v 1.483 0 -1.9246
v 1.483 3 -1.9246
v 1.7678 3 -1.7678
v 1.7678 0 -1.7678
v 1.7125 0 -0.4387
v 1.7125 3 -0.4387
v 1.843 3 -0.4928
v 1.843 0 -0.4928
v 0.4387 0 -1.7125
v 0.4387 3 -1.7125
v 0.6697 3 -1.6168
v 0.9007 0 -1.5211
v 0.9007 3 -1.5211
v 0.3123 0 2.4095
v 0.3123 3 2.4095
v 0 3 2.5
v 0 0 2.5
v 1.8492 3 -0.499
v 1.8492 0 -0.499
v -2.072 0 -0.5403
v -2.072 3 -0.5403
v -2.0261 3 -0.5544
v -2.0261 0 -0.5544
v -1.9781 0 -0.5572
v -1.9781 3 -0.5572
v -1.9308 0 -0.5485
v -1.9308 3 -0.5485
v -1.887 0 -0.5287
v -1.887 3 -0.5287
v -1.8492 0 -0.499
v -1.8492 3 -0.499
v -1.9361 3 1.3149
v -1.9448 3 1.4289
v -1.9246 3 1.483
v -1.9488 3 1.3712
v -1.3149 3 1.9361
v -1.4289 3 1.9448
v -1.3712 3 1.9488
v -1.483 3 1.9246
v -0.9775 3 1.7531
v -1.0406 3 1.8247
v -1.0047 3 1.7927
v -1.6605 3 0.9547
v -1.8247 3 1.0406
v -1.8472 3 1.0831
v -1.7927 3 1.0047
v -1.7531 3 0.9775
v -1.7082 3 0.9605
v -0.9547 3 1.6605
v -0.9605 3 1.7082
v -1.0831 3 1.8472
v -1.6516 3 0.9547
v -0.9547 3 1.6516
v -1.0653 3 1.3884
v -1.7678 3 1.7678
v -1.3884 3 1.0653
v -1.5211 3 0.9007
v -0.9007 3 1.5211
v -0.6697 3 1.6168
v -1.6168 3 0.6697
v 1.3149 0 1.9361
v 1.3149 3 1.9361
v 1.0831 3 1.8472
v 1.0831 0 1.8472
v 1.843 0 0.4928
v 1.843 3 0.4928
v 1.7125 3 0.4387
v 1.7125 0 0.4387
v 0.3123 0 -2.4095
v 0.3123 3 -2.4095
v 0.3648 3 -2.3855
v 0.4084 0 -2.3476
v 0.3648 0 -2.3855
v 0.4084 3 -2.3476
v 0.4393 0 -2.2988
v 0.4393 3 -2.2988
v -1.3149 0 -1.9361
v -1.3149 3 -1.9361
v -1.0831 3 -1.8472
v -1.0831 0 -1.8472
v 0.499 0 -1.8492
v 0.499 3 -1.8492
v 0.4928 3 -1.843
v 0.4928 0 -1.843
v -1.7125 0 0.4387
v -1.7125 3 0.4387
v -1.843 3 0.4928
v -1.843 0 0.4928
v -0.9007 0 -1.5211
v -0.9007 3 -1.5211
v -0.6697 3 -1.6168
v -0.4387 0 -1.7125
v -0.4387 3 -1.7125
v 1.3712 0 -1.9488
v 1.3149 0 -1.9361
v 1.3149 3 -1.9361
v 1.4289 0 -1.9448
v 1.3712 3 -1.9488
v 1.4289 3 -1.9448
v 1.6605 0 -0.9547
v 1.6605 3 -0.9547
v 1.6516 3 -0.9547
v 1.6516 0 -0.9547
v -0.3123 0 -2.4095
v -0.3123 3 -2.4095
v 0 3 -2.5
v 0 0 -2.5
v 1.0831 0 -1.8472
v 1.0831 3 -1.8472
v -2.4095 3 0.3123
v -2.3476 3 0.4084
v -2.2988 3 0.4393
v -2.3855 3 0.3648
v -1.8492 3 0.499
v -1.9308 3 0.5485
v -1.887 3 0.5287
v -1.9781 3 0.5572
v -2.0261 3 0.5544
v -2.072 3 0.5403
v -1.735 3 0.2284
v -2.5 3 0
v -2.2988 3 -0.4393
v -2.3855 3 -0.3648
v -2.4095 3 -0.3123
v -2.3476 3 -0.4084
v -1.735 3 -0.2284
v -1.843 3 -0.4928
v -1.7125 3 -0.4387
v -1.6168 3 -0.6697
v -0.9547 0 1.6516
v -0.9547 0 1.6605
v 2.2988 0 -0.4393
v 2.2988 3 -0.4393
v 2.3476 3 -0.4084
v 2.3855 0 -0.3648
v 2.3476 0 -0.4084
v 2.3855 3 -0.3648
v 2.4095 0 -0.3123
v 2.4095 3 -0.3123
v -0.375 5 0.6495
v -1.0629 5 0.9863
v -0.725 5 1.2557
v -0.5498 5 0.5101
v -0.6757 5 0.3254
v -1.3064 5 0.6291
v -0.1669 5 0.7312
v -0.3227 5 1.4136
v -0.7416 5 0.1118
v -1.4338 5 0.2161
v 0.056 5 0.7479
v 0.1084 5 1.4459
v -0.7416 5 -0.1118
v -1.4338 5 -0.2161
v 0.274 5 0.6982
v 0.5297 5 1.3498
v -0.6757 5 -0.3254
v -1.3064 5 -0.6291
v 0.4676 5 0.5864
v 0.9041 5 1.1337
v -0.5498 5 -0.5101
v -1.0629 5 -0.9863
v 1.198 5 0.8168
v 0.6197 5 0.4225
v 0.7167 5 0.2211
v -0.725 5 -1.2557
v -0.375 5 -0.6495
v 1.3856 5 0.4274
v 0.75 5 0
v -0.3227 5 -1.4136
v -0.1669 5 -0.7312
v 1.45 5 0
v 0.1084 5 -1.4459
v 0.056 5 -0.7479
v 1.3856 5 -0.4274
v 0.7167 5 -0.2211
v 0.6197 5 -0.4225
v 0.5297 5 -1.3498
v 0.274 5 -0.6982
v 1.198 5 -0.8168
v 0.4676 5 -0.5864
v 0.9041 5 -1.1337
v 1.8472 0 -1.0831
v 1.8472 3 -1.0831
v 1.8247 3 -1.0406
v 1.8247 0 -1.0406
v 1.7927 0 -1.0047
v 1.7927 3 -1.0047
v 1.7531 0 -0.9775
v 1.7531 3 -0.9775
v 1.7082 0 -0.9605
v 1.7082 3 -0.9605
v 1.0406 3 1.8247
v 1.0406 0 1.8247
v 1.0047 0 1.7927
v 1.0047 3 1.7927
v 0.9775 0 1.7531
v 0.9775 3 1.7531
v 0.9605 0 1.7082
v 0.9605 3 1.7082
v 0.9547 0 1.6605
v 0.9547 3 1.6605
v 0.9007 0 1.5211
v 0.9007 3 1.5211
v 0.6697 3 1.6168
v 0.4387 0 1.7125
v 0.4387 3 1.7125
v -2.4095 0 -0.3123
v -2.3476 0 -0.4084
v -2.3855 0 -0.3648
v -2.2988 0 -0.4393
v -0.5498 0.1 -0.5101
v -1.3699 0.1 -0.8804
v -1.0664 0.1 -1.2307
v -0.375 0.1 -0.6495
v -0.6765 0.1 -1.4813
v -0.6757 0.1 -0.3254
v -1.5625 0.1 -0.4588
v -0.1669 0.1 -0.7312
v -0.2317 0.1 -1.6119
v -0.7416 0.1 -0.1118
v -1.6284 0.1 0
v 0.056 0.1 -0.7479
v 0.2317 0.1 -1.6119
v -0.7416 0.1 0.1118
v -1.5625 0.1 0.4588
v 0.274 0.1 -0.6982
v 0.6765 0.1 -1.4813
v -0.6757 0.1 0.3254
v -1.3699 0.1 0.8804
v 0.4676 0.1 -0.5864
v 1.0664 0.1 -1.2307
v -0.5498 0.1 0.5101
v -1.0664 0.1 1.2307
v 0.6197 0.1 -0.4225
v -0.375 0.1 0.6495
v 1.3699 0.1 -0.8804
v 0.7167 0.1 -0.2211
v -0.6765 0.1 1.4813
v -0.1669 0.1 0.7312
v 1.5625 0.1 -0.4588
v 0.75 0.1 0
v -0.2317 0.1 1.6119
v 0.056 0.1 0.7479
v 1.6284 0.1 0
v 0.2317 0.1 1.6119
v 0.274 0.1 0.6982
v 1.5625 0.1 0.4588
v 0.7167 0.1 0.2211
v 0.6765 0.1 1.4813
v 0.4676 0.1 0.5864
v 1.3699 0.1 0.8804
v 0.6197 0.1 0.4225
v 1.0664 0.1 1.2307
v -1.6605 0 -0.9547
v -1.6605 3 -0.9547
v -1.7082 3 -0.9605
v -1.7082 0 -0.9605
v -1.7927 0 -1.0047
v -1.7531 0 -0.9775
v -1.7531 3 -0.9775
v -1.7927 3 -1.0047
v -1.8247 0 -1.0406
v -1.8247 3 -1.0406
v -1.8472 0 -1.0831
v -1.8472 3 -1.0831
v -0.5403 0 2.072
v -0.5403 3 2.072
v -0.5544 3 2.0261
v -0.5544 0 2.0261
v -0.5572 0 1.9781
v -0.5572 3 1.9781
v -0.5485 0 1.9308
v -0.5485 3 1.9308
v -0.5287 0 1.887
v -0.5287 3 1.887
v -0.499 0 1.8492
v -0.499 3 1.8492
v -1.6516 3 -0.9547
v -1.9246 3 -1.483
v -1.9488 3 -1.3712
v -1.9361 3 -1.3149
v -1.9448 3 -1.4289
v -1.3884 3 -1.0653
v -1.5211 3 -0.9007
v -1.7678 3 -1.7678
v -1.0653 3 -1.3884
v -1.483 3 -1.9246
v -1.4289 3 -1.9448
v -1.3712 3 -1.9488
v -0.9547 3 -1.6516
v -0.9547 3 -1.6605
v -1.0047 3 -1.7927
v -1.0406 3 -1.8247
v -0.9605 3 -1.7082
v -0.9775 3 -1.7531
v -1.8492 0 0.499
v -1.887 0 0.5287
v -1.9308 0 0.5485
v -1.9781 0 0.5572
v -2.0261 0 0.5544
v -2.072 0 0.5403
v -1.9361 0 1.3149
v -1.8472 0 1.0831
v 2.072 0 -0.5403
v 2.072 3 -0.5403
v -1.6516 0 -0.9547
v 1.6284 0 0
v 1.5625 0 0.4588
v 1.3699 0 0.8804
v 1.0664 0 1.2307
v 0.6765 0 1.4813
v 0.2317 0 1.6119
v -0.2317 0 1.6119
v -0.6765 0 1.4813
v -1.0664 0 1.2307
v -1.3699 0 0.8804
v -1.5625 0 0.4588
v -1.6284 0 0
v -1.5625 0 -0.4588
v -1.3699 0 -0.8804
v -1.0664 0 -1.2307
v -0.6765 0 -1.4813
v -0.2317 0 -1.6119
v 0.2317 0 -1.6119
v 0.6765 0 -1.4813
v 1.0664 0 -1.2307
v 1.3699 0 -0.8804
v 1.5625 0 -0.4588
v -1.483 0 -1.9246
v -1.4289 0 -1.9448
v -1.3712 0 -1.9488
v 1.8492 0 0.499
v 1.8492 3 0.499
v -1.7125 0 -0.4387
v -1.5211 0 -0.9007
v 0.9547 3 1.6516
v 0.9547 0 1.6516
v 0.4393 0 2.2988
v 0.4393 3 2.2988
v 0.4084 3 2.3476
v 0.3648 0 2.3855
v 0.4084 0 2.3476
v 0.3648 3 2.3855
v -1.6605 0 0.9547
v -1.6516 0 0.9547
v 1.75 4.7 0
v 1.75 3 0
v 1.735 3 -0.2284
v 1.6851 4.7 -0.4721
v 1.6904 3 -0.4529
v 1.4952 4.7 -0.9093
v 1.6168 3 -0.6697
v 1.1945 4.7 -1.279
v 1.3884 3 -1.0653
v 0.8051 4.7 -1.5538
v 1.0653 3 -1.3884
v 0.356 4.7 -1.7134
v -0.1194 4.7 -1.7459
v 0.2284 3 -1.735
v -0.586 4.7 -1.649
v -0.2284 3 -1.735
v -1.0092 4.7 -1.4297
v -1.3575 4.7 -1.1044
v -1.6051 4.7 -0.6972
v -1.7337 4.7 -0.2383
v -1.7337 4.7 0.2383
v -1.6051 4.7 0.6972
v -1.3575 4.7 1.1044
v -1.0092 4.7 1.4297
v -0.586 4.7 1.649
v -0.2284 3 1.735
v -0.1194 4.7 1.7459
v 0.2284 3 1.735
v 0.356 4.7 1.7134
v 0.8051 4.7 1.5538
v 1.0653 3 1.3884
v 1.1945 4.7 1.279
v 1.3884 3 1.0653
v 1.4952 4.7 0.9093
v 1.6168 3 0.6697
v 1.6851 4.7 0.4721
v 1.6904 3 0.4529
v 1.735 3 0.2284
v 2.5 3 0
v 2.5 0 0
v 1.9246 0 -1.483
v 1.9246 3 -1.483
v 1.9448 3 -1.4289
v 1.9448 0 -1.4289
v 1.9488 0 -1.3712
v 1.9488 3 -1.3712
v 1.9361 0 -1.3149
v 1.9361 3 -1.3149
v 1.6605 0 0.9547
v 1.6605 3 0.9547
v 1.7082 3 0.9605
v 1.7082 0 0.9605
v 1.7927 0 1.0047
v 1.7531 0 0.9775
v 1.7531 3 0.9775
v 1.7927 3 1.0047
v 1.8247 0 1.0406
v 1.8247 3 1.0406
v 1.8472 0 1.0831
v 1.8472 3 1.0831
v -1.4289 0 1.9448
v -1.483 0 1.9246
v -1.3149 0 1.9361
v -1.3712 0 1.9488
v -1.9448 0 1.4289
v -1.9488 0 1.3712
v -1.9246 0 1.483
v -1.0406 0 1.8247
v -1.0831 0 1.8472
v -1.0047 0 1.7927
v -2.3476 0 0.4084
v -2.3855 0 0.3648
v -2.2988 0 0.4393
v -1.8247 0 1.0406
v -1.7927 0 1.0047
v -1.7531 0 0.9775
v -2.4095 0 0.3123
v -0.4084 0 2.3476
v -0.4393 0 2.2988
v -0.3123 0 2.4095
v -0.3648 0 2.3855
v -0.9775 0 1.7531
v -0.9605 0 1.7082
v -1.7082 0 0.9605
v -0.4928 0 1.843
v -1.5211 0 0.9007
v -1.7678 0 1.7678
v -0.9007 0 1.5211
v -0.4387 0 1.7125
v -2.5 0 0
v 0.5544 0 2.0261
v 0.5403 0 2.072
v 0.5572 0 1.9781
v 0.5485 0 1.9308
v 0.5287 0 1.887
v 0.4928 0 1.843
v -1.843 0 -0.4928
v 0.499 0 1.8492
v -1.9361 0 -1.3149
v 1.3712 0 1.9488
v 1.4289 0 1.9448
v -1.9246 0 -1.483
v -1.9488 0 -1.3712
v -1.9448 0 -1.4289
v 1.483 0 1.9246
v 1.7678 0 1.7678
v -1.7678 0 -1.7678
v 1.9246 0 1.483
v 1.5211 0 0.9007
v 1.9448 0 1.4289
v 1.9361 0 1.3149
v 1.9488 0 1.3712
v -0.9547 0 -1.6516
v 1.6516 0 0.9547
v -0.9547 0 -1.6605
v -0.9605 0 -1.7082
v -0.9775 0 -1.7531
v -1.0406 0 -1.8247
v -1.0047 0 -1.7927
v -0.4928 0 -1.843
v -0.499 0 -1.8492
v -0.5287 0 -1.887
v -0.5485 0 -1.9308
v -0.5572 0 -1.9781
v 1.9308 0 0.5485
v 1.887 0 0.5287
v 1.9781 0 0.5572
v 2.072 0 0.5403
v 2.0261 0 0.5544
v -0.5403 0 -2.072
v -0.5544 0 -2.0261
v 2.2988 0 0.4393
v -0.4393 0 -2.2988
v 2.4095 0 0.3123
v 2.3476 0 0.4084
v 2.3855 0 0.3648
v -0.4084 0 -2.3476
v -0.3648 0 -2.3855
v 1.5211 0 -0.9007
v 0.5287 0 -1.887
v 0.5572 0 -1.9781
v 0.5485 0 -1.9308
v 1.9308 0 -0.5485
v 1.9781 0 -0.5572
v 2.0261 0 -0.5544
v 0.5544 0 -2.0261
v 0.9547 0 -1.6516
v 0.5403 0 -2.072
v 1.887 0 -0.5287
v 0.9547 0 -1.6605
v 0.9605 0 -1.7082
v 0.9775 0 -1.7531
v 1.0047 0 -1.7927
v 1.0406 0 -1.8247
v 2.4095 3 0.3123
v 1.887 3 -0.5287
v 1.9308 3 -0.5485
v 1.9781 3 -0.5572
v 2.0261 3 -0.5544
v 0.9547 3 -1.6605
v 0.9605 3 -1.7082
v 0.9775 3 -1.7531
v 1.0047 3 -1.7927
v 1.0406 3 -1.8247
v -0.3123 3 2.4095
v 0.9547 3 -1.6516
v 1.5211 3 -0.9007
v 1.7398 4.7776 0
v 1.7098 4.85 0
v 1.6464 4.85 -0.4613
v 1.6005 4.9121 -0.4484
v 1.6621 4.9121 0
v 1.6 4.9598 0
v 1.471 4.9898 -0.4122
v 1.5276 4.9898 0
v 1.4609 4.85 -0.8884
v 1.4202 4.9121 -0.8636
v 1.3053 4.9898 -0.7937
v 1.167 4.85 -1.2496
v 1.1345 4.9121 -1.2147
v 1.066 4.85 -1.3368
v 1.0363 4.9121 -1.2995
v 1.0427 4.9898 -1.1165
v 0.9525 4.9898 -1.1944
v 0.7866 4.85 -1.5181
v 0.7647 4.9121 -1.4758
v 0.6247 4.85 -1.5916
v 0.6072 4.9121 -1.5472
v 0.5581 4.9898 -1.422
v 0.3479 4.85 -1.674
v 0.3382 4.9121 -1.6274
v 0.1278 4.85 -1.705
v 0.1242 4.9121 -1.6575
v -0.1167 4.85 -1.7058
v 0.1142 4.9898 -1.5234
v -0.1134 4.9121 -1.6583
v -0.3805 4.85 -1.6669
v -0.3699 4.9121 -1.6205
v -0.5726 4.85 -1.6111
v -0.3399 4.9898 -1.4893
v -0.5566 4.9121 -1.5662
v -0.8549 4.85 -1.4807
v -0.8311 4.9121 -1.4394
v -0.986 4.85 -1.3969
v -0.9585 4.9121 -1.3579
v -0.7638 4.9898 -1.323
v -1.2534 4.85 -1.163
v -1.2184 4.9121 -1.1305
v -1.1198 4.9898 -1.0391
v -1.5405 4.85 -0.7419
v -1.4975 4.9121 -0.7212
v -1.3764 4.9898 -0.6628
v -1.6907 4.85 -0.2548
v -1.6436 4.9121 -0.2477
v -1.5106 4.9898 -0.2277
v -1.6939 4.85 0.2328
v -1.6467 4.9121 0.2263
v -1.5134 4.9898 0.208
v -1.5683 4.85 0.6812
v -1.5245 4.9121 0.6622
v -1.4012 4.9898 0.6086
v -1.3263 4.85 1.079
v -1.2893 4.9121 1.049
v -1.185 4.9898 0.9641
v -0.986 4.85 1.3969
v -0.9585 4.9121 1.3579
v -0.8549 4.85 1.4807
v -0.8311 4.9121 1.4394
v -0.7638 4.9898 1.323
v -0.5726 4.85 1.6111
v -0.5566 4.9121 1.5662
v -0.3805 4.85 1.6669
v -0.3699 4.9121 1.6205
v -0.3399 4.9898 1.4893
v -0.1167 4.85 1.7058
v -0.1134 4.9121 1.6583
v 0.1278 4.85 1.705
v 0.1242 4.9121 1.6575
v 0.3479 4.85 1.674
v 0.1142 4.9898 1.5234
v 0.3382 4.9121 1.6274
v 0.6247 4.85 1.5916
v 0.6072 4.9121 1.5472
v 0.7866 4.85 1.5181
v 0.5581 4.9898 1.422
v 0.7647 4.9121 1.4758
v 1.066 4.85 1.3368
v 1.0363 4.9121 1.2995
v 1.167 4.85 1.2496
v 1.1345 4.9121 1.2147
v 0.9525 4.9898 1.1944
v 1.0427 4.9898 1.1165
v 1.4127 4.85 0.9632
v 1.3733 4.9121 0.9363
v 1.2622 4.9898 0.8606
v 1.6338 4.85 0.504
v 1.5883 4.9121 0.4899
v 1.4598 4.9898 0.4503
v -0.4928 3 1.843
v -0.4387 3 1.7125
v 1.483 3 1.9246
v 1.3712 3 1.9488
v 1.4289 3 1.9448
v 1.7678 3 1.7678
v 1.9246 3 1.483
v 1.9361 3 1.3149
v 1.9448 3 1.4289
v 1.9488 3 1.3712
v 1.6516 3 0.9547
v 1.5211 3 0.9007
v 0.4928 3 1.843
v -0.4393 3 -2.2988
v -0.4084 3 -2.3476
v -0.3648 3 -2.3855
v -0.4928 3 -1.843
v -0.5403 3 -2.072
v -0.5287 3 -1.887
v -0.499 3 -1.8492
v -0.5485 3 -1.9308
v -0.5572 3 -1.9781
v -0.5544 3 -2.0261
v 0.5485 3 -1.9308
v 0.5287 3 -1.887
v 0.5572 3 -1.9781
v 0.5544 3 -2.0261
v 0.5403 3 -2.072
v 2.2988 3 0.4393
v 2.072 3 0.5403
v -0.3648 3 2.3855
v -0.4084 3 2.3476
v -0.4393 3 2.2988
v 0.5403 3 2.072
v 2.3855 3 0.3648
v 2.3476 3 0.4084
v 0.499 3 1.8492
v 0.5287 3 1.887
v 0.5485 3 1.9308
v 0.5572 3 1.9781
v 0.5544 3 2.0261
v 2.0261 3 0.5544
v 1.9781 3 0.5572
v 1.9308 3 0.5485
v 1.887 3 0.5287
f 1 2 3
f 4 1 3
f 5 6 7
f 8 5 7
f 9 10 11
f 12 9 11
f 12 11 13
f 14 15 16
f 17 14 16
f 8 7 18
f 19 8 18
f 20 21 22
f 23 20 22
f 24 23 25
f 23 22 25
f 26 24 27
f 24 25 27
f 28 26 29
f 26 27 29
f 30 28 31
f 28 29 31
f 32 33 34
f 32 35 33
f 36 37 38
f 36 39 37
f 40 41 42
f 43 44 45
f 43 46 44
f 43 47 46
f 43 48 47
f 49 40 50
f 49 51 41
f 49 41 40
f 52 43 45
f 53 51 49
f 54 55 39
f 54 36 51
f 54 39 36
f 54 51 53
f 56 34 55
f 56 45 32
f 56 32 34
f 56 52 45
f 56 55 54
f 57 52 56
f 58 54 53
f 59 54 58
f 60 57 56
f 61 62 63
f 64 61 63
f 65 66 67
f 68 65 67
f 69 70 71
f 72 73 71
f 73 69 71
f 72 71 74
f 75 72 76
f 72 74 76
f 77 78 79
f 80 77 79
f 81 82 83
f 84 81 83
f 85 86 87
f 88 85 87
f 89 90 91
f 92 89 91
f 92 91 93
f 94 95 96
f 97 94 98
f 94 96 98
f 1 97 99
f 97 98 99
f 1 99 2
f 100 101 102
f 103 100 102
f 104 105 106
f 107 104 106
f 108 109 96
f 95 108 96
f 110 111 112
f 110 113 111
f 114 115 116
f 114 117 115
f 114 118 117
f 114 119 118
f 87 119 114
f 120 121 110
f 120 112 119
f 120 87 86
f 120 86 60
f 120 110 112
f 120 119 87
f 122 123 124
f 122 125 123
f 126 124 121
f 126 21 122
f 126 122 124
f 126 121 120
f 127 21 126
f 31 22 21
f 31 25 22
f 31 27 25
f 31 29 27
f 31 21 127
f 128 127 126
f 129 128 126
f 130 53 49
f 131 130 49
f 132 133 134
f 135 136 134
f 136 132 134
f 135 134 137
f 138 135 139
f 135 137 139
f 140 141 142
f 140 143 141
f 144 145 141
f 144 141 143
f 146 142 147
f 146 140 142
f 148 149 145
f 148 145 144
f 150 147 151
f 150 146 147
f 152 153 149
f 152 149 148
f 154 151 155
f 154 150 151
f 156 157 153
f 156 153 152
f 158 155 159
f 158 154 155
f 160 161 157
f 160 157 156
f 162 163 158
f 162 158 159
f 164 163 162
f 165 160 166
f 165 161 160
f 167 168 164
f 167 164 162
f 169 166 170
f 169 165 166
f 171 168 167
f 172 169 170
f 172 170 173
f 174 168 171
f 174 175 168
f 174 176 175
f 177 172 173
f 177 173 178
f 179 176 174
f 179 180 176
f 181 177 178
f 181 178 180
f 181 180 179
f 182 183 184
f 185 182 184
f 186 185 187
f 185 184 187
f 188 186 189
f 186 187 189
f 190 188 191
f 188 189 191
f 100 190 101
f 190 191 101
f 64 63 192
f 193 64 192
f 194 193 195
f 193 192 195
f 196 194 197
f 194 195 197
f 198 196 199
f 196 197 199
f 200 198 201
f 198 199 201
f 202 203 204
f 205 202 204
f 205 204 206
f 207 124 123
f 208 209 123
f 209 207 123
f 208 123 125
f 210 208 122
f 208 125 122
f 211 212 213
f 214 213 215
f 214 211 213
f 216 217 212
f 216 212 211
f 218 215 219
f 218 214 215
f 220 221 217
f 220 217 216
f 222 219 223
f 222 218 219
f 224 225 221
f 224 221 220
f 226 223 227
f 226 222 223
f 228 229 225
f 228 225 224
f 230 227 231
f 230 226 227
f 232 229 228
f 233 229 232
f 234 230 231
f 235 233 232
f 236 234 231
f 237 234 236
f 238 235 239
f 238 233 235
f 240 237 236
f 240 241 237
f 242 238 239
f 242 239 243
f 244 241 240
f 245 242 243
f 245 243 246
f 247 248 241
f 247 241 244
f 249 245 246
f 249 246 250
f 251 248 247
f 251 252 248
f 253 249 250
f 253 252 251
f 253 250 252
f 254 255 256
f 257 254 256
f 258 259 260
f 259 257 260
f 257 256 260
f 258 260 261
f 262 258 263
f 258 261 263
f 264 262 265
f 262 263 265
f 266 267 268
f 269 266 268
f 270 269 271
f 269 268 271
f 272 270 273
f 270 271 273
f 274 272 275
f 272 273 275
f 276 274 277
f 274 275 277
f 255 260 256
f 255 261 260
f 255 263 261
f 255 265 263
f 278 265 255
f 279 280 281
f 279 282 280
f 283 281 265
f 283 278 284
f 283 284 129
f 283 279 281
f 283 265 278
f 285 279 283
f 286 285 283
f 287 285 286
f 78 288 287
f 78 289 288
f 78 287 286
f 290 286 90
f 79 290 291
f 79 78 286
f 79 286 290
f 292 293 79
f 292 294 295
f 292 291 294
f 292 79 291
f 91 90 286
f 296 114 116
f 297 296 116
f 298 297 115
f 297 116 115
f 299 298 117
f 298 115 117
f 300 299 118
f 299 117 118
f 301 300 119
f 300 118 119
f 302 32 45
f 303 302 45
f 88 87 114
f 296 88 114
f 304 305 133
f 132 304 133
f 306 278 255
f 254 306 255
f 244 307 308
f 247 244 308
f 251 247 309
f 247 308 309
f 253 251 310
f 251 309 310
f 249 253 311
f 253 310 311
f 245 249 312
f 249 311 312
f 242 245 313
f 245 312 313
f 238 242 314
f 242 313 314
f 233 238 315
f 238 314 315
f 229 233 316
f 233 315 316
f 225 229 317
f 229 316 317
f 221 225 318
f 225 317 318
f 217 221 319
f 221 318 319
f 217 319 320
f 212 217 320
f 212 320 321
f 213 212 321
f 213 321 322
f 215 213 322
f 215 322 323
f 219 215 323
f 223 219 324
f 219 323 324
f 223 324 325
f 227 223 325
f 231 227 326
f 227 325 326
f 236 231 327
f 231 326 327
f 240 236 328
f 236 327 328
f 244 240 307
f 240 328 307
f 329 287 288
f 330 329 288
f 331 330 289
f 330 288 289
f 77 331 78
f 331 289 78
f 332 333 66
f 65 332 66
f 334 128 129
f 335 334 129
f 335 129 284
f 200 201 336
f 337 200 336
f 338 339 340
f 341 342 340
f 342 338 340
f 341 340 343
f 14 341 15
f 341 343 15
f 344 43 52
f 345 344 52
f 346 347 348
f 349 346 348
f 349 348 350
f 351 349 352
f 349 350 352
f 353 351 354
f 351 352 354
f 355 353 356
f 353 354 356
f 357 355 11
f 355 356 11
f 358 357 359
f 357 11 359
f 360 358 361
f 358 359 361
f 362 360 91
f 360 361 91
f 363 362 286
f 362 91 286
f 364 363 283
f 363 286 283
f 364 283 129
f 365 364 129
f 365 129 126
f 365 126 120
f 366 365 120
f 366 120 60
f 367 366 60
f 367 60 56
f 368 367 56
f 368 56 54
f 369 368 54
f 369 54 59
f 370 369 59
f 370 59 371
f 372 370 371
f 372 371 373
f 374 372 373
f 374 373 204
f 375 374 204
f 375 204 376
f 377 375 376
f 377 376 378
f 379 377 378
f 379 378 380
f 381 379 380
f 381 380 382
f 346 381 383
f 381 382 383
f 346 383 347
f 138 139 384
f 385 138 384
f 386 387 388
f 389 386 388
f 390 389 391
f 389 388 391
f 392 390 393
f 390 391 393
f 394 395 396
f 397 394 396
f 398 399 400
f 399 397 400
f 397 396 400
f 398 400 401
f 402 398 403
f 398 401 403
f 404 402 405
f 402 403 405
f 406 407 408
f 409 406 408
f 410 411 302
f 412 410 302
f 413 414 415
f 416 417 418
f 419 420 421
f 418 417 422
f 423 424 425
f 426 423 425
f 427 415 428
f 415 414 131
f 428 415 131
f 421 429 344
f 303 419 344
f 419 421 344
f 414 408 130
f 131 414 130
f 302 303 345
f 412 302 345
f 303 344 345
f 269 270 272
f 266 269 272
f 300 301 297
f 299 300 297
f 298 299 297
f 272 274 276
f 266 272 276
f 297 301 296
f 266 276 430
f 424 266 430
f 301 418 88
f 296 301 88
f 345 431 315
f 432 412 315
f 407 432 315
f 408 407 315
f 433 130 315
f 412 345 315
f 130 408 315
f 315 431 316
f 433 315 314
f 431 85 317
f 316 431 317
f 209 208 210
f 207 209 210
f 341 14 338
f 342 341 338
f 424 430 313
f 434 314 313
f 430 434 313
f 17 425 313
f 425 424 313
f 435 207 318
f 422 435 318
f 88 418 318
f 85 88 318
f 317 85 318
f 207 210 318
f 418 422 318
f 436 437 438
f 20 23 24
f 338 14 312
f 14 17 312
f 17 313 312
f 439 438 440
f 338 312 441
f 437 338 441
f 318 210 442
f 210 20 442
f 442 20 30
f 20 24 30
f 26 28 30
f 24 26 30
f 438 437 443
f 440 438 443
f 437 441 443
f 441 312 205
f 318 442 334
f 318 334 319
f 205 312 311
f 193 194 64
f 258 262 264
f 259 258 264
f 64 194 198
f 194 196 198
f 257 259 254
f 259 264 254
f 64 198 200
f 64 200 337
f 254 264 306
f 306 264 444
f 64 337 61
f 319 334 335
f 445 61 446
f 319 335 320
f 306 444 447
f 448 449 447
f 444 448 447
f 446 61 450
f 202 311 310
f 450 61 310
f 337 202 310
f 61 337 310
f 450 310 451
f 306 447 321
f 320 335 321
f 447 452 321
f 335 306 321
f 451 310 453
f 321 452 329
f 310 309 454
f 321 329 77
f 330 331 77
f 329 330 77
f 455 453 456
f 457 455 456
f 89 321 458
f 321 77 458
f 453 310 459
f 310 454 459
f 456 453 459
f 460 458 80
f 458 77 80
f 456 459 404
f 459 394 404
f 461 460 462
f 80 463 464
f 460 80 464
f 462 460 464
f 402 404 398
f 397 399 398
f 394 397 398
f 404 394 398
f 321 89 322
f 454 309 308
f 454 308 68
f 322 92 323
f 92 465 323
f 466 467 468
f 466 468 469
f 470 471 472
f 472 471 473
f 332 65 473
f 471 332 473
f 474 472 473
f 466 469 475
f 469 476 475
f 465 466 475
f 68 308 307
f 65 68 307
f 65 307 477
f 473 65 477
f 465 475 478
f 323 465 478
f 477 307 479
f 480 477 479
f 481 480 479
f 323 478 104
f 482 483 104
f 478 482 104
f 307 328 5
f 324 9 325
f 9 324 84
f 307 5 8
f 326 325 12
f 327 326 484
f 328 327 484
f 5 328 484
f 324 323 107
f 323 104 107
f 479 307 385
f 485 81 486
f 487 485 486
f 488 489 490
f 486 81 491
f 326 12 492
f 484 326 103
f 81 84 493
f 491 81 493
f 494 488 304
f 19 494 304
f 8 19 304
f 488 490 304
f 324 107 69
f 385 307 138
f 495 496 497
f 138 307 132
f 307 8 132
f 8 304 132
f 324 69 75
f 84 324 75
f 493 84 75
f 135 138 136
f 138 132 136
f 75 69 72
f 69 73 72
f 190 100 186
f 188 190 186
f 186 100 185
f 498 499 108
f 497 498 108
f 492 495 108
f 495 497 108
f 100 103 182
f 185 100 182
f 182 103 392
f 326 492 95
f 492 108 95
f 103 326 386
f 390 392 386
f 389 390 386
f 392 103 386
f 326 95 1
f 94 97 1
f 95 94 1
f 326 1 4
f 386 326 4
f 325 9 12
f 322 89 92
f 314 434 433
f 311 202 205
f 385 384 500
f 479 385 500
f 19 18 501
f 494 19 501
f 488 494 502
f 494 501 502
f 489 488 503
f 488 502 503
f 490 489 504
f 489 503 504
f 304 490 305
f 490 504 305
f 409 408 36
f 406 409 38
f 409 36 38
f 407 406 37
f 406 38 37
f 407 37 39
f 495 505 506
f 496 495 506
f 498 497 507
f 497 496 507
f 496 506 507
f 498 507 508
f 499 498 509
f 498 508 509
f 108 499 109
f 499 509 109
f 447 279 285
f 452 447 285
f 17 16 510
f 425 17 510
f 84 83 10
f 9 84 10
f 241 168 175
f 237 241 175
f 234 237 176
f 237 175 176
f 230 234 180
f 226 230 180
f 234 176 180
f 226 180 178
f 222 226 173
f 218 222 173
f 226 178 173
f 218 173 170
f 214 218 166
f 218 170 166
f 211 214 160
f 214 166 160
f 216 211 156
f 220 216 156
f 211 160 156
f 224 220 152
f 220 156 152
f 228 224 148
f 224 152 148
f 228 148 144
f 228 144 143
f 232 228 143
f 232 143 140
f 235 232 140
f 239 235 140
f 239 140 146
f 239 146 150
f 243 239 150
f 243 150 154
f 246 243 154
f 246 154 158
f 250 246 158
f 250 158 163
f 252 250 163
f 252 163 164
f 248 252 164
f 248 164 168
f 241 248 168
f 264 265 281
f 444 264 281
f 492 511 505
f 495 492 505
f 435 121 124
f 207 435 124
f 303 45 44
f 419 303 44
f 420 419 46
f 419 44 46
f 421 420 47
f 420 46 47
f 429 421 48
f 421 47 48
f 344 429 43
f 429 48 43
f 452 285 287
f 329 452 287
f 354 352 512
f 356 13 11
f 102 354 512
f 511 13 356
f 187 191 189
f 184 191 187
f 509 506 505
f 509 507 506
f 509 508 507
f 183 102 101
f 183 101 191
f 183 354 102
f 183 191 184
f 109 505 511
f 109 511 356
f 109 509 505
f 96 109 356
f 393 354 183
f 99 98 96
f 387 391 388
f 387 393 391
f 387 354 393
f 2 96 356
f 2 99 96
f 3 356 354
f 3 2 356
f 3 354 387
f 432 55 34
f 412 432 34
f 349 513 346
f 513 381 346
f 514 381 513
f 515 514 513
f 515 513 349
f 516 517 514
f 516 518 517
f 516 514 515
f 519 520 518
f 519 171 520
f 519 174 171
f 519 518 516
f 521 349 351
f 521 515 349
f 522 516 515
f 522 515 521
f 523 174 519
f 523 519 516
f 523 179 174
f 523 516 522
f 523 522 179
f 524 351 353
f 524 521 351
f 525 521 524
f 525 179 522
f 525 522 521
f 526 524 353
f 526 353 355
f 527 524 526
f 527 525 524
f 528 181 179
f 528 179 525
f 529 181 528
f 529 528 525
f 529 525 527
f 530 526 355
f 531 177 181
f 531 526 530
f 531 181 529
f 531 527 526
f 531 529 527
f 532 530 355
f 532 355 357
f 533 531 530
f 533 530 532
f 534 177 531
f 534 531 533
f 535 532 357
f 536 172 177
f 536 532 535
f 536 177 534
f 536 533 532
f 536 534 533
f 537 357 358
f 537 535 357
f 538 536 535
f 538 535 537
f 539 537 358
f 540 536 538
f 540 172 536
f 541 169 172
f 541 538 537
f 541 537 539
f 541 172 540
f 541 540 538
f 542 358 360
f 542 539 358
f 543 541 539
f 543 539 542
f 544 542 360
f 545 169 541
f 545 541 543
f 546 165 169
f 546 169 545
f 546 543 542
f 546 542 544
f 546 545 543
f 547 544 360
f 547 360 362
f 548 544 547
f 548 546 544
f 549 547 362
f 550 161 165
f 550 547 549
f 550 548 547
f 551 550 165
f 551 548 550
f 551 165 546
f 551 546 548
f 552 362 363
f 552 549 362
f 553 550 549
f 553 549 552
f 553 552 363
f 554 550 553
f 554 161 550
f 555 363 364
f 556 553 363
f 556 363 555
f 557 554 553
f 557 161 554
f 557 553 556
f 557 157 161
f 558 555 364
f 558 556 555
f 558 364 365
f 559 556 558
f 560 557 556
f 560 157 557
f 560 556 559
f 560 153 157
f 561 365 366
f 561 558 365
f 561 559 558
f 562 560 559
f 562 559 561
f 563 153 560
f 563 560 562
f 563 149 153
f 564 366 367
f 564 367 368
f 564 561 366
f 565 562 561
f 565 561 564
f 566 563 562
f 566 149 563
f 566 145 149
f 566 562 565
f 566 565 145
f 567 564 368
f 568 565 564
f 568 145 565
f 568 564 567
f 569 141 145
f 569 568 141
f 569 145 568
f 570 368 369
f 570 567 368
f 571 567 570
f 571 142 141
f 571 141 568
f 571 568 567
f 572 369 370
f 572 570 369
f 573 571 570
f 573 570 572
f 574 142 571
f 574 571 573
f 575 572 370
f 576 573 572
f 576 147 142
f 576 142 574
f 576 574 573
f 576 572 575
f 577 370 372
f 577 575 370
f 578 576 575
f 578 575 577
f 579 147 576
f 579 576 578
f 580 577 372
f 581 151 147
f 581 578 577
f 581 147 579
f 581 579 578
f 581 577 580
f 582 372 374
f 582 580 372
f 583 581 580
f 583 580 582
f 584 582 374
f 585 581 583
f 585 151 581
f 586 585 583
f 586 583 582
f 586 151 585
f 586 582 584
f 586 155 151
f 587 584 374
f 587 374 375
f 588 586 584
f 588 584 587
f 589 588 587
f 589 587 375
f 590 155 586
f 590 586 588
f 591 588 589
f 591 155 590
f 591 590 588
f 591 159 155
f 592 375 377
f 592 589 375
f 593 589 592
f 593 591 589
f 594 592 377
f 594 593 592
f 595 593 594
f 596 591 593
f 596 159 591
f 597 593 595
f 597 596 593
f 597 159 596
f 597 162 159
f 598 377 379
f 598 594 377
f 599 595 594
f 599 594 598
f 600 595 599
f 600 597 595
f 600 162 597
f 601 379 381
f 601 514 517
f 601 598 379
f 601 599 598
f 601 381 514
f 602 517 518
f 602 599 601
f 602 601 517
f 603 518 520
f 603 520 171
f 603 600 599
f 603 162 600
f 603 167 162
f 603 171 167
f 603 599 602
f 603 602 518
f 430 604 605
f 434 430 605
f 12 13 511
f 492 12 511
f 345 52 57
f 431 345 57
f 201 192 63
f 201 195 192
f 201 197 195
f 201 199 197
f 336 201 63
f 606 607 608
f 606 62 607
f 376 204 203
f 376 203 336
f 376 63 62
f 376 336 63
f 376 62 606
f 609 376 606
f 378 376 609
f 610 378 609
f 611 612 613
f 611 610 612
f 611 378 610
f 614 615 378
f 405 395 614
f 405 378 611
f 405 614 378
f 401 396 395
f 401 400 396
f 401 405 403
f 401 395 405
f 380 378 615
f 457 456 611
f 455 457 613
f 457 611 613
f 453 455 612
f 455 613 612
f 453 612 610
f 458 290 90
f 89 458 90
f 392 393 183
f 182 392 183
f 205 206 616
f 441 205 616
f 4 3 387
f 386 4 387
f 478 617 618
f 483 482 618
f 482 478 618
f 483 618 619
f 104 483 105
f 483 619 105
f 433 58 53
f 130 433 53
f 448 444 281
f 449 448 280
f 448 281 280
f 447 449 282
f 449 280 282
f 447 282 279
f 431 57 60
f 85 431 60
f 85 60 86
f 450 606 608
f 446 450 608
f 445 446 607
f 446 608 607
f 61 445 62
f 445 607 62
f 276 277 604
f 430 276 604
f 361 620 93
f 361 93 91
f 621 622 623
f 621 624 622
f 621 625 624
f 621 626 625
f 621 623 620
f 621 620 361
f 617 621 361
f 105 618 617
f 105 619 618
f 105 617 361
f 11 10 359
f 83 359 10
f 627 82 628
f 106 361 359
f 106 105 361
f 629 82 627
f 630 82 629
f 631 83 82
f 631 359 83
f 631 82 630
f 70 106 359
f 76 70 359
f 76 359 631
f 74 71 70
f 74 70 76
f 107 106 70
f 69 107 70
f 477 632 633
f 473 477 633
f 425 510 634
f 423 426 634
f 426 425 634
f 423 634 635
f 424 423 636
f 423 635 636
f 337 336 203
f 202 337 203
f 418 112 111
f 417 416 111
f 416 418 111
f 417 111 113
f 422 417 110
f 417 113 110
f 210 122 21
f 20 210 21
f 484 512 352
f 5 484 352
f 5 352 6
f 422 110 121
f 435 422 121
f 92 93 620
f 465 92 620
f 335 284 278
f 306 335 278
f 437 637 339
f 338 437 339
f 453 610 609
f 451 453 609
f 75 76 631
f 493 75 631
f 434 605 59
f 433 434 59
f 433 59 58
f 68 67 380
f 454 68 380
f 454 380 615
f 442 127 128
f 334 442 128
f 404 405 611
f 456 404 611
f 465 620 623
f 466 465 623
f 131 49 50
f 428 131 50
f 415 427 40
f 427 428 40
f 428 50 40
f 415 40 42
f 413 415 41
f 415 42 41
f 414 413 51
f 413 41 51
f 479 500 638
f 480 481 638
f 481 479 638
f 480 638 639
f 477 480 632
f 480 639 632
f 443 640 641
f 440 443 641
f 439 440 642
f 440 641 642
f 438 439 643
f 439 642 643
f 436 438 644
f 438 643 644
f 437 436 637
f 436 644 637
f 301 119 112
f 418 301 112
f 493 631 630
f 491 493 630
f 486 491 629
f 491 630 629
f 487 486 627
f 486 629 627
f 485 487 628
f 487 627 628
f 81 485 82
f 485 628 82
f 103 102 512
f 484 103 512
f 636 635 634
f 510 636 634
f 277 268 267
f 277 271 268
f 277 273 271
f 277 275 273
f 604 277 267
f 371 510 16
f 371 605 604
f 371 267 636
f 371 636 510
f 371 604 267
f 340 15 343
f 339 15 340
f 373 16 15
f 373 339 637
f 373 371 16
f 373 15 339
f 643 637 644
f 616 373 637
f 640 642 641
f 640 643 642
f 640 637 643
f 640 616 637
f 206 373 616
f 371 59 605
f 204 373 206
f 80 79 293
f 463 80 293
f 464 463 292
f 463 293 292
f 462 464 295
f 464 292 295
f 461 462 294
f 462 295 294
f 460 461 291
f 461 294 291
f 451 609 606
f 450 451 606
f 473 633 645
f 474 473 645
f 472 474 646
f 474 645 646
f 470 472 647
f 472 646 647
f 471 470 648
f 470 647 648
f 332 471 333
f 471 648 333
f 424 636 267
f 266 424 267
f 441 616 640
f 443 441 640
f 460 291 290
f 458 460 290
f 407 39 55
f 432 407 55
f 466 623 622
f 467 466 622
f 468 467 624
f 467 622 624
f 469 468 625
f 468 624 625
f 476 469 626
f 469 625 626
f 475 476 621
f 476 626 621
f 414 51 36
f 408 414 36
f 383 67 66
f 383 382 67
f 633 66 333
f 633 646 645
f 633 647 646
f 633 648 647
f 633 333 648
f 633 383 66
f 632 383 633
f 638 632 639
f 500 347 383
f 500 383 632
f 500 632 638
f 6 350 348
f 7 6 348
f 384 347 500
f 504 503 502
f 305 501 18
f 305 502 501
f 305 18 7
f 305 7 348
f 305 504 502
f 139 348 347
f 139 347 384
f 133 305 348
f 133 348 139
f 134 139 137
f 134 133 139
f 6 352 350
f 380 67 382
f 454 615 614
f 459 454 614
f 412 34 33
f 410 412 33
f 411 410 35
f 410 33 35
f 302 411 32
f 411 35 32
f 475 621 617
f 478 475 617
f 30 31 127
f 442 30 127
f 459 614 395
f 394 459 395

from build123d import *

# Parameters (mm, degrees)
SKETCH1_R           = 2.5
BOSS_EXTRUDE1_DEPTH = 3
SKETCH2_R           = 1.75
BOSS_EXTRUDE2_DEPTH = 2
SKETCH3_R           = 0.75
CUT_EXTRUDE1_DEPTH  = 6
SKETCH4_R           = 2.750200345
CUT_EXTRUDE3_DEPTH  = 4
SKETCH5_R           = 1.628426881
CUT_EXTRUDE4_DEPTH  = 0.1
FILLET1_R           = 0.3


with BuildPart() as part:
    # Sketch1 → Boss-Extrude1 (new body)
    with BuildSketch(Plane(origin=(0, 0, 0), x_dir=(1, 0, 0), z_dir=(0, 1, 0))):
        Circle(SKETCH1_R)
    extrude(amount=BOSS_EXTRUDE1_DEPTH)

    # Sketch2 → Boss-Extrude2 (add)
    with BuildSketch(Plane(origin=(0, 3, 0), x_dir=(1, 0, 0), z_dir=(0, 1, 0))):
        Circle(SKETCH2_R)
    extrude(amount=BOSS_EXTRUDE2_DEPTH)

    # Sketch3 → Cut-Extrude1 (cut, through all)
    with BuildSketch(Plane(origin=(0, 5, 0), x_dir=(1, 0, 0), z_dir=(0, 1, 0))):
        Circle(SKETCH3_R)
    extrude(amount=-CUT_EXTRUDE1_DEPTH, mode=Mode.SUBTRACT)

    # Sketch4 → Cut-Extrude3 (cut, through all)
    with BuildSketch(Plane(origin=(0, 3, 0), x_dir=(1, 0, 0), z_dir=(0, 1, 0))):
        Circle(SKETCH4_R)
        with BuildLine():
            Line((-1.71246004, 0.438726124), (-1.521118324, 0.90066589))
            Line((-1.521118324, 0.90066589), (-1.651645181, 0.954731884))
            Line((-1.651645181, 0.954731884), (-1.660451872, 0.954731884))
            ThreePointArc((-1.660451872, 0.954731884), (-1.773754473, 0.989921325), (-1.847186523, 1.083106679))
            Line((-1.847186523, 1.083106679), (-1.936085443, 1.314875773))
            ThreePointArc((-1.936085443, 1.314875773), (-1.948881988, 1.400186804), (-1.924557132, 1.482951682))
            Line((-1.924557132, 1.482951682), (-1.767766953, 1.767766953))
            Line((-1.767766953, 1.767766953), (-1.482951682, 1.924557132))
            ThreePointArc((-1.482951682, 1.924557132), (-1.400186804, 1.948881988), (-1.314875773, 1.936085443))
            Line((-1.314875773, 1.936085443), (-1.083106679, 1.847186523))
            ThreePointArc((-1.083106679, 1.847186523), (-0.989921325, 1.773754473), (-0.954731884, 1.660451872))
            Line((-0.954731884, 1.660451872), (-0.954731884, 1.651645181))
            Line((-0.954731884, 1.651645181), (-0.90066589, 1.521118324))
            Line((-0.90066589, 1.521118324), (-0.438726124, 1.71246004))
            Line((-0.438726124, 1.71246004), (-0.492792118, 1.842986897))
            Line((-0.492792118, 1.842986897), (-0.499019389, 1.849214168))
            ThreePointArc((-0.499019389, 1.849214168), (-0.554253735, 1.954213898), (-0.540286039, 2.072030195))
            Line((-0.540286039, 2.072030195), (-0.43926157, 2.298776721))
            ThreePointArc((-0.43926157, 2.298776721), (-0.387986085, 2.368149253), (-0.312262208, 2.409472589))
            Line((-0.312262208, 2.409472589), (0, 2.5))
            Line((0, 2.5), (0.312262208, 2.409472589))
            ThreePointArc((0.312262208, 2.409472589), (0.387986085, 2.368149253), (0.43926157, 2.298776721))
            Line((0.43926157, 2.298776721), (0.540286039, 2.072030195))
            ThreePointArc((0.540286039, 2.072030195), (0.554253735, 1.954213898), (0.499019389, 1.849214168))
            Line((0.499019389, 1.849214168), (0.492792118, 1.842986897))
            Line((0.492792118, 1.842986897), (0.438726124, 1.71246004))
            Line((0.438726124, 1.71246004), (0.90066589, 1.521118324))
            Line((0.90066589, 1.521118324), (0.954731884, 1.651645181))
            Line((0.954731884, 1.651645181), (0.954731884, 1.660451872))
            ThreePointArc((0.954731884, 1.660451872), (0.989921325, 1.773754473), (1.083106679, 1.847186523))
            Line((1.083106679, 1.847186523), (1.314875773, 1.936085443))
            ThreePointArc((1.314875773, 1.936085443), (1.400186804, 1.948881988), (1.482951682, 1.924557132))
            Line((1.482951682, 1.924557132), (1.767766953, 1.767766953))
            Line((1.767766953, 1.767766953), (1.924557132, 1.482951682))
            ThreePointArc((1.924557132, 1.482951682), (1.948881988, 1.400186804), (1.936085443, 1.314875773))
            Line((1.936085443, 1.314875773), (1.847186523, 1.083106679))
            ThreePointArc((1.847186523, 1.083106679), (1.773754473, 0.989921325), (1.660451872, 0.954731884))
            Line((1.660451872, 0.954731884), (1.651645181, 0.954731884))
            Line((1.651645181, 0.954731884), (1.521118324, 0.90066589))
            Line((1.521118324, 0.90066589), (1.71246004, 0.438726124))
            Line((1.71246004, 0.438726124), (1.842986897, 0.492792118))
            Line((1.842986897, 0.492792118), (1.849214168, 0.499019389))
            ThreePointArc((1.849214168, 0.499019389), (1.954213898, 0.554253735), (2.072030195, 0.540286039))
            Line((2.072030195, 0.540286039), (2.298776721, 0.43926157))
            ThreePointArc((2.298776721, 0.43926157), (2.368149253, 0.387986085), (2.409472589, 0.312262208))
            Line((2.409472589, 0.312262208), (2.5, 0))
            Line((2.5, 0), (2.409472589, -0.312262208))
            ThreePointArc((2.409472589, -0.312262208), (2.368149253, -0.387986085), (2.298776721, -0.43926157))
            Line((2.298776721, -0.43926157), (2.072030195, -0.540286039))
            ThreePointArc((2.072030195, -0.540286039), (1.954213898, -0.554253735), (1.849214168, -0.499019389))
            Line((1.849214168, -0.499019389), (1.842986897, -0.492792118))
            Line((1.842986897, -0.492792118), (1.71246004, -0.438726124))
            Line((1.71246004, -0.438726124), (1.521118324, -0.90066589))
            Line((1.521118324, -0.90066589), (1.651645181, -0.954731884))
            Line((1.651645181, -0.954731884), (1.660451872, -0.954731884))
            ThreePointArc((1.660451872, -0.954731884), (1.773754473, -0.989921325), (1.847186523, -1.083106679))
            Line((1.847186523, -1.083106679), (1.936085443, -1.314875773))
            ThreePointArc((1.936085443, -1.314875773), (1.948881988, -1.400186804), (1.924557132, -1.482951682))
            Line((1.924557132, -1.482951682), (1.767766953, -1.767766953))
            Line((1.767766953, -1.767766953), (1.482951682, -1.924557132))
            ThreePointArc((1.482951682, -1.924557132), (1.400186804, -1.948881988), (1.314875773, -1.936085443))
            Line((1.314875773, -1.936085443), (1.083106679, -1.847186523))
            ThreePointArc((1.083106679, -1.847186523), (0.989921325, -1.773754473), (0.954731884, -1.660451872))
            Line((0.954731884, -1.660451872), (0.954731884, -1.651645181))
            Line((0.954731884, -1.651645181), (0.90066589, -1.521118324))
            Line((0.90066589, -1.521118324), (0.438726124, -1.71246004))
            Line((0.438726124, -1.71246004), (0.492792118, -1.842986897))
            Line((0.492792118, -1.842986897), (0.499019389, -1.849214168))
            ThreePointArc((0.499019389, -1.849214168), (0.554253735, -1.954213898), (0.540286039, -2.072030195))
            Line((0.540286039, -2.072030195), (0.43926157, -2.298776721))
            ThreePointArc((0.43926157, -2.298776721), (0.387986085, -2.368149253), (0.312262208, -2.409472589))
            Line((0.312262208, -2.409472589), (0, -2.5))
            Line((0, -2.5), (-0.312262208, -2.409472589))
            ThreePointArc((-0.312262208, -2.409472589), (-0.387986085, -2.368149253), (-0.43926157, -2.298776721))
            Line((-0.43926157, -2.298776721), (-0.540286039, -2.072030195))
            ThreePointArc((-0.540286039, -2.072030195), (-0.554253735, -1.954213898), (-0.499019389, -1.849214168))
            Line((-0.499019389, -1.849214168), (-0.492792118, -1.842986897))
            Line((-0.492792118, -1.842986897), (-0.438726124, -1.71246004))
            Line((-0.438726124, -1.71246004), (-0.90066589, -1.521118324))
            Line((-0.90066589, -1.521118324), (-0.954731884, -1.651645181))
            Line((-0.954731884, -1.651645181), (-0.954731884, -1.660451872))
            ThreePointArc((-0.954731884, -1.660451872), (-0.989921325, -1.773754473), (-1.083106679, -1.847186523))
            Line((-1.083106679, -1.847186523), (-1.314875773, -1.936085443))
            ThreePointArc((-1.314875773, -1.936085443), (-1.400186804, -1.948881988), (-1.482951682, -1.924557132))
            Line((-1.482951682, -1.924557132), (-1.767766953, -1.767766953))
            Line((-1.767766953, -1.767766953), (-1.924557132, -1.482951682))
            ThreePointArc((-1.924557132, -1.482951682), (-1.948881988, -1.400186804), (-1.936085443, -1.314875773))
            Line((-1.936085443, -1.314875773), (-1.847186523, -1.083106679))
            ThreePointArc((-1.847186523, -1.083106679), (-1.773754473, -0.989921325), (-1.660451872, -0.954731884))
            Line((-1.660451872, -0.954731884), (-1.651645181, -0.954731884))
            Line((-1.651645181, -0.954731884), (-1.521118324, -0.90066589))
            Line((-1.521118324, -0.90066589), (-1.71246004, -0.438726124))
            Line((-1.71246004, -0.438726124), (-1.842986897, -0.492792118))
            Line((-1.842986897, -0.492792118), (-1.849214168, -0.499019389))
            ThreePointArc((-1.849214168, -0.499019389), (-1.954213898, -0.554253735), (-2.072030195, -0.540286039))
            Line((-2.072030195, -0.540286039), (-2.298776721, -0.43926157))
            ThreePointArc((-2.298776721, -0.43926157), (-2.368149253, -0.387986085), (-2.409472589, -0.312262208))
            Line((-2.409472589, -0.312262208), (-2.5, 0))
            Line((-2.5, 0), (-2.409472589, 0.312262208))
            ThreePointArc((-2.409472589, 0.312262208), (-2.368149253, 0.387986085), (-2.298776721, 0.43926157))
            Line((-2.298776721, 0.43926157), (-2.072030195, 0.540286039))
            ThreePointArc((-2.072030195, 0.540286039), (-1.954213898, 0.554253735), (-1.849214168, 0.499019389))
            Line((-1.849214168, 0.499019389), (-1.842986897, 0.492792118))
            Line((-1.842986897, 0.492792118), (-1.71246004, 0.438726124))
        make_face(mode=Mode.SUBTRACT)
    extrude(amount=-CUT_EXTRUDE3_DEPTH, mode=Mode.SUBTRACT)

    # Sketch5 → Cut-Extrude4 (cut)
    with BuildSketch(Plane.XZ):
        Circle(SKETCH5_R)
    extrude(amount=-CUT_EXTRUDE4_DEPTH, mode=Mode.SUBTRACT)

    # Fillet1
    fillet1_edges = [part.edges().sort_by_distance(p)[0] for p in [
        (-1.75, 5, 0),
    ]]
    fillet(fillet1_edges, radius=FILLET1_R)


solid = part.part
